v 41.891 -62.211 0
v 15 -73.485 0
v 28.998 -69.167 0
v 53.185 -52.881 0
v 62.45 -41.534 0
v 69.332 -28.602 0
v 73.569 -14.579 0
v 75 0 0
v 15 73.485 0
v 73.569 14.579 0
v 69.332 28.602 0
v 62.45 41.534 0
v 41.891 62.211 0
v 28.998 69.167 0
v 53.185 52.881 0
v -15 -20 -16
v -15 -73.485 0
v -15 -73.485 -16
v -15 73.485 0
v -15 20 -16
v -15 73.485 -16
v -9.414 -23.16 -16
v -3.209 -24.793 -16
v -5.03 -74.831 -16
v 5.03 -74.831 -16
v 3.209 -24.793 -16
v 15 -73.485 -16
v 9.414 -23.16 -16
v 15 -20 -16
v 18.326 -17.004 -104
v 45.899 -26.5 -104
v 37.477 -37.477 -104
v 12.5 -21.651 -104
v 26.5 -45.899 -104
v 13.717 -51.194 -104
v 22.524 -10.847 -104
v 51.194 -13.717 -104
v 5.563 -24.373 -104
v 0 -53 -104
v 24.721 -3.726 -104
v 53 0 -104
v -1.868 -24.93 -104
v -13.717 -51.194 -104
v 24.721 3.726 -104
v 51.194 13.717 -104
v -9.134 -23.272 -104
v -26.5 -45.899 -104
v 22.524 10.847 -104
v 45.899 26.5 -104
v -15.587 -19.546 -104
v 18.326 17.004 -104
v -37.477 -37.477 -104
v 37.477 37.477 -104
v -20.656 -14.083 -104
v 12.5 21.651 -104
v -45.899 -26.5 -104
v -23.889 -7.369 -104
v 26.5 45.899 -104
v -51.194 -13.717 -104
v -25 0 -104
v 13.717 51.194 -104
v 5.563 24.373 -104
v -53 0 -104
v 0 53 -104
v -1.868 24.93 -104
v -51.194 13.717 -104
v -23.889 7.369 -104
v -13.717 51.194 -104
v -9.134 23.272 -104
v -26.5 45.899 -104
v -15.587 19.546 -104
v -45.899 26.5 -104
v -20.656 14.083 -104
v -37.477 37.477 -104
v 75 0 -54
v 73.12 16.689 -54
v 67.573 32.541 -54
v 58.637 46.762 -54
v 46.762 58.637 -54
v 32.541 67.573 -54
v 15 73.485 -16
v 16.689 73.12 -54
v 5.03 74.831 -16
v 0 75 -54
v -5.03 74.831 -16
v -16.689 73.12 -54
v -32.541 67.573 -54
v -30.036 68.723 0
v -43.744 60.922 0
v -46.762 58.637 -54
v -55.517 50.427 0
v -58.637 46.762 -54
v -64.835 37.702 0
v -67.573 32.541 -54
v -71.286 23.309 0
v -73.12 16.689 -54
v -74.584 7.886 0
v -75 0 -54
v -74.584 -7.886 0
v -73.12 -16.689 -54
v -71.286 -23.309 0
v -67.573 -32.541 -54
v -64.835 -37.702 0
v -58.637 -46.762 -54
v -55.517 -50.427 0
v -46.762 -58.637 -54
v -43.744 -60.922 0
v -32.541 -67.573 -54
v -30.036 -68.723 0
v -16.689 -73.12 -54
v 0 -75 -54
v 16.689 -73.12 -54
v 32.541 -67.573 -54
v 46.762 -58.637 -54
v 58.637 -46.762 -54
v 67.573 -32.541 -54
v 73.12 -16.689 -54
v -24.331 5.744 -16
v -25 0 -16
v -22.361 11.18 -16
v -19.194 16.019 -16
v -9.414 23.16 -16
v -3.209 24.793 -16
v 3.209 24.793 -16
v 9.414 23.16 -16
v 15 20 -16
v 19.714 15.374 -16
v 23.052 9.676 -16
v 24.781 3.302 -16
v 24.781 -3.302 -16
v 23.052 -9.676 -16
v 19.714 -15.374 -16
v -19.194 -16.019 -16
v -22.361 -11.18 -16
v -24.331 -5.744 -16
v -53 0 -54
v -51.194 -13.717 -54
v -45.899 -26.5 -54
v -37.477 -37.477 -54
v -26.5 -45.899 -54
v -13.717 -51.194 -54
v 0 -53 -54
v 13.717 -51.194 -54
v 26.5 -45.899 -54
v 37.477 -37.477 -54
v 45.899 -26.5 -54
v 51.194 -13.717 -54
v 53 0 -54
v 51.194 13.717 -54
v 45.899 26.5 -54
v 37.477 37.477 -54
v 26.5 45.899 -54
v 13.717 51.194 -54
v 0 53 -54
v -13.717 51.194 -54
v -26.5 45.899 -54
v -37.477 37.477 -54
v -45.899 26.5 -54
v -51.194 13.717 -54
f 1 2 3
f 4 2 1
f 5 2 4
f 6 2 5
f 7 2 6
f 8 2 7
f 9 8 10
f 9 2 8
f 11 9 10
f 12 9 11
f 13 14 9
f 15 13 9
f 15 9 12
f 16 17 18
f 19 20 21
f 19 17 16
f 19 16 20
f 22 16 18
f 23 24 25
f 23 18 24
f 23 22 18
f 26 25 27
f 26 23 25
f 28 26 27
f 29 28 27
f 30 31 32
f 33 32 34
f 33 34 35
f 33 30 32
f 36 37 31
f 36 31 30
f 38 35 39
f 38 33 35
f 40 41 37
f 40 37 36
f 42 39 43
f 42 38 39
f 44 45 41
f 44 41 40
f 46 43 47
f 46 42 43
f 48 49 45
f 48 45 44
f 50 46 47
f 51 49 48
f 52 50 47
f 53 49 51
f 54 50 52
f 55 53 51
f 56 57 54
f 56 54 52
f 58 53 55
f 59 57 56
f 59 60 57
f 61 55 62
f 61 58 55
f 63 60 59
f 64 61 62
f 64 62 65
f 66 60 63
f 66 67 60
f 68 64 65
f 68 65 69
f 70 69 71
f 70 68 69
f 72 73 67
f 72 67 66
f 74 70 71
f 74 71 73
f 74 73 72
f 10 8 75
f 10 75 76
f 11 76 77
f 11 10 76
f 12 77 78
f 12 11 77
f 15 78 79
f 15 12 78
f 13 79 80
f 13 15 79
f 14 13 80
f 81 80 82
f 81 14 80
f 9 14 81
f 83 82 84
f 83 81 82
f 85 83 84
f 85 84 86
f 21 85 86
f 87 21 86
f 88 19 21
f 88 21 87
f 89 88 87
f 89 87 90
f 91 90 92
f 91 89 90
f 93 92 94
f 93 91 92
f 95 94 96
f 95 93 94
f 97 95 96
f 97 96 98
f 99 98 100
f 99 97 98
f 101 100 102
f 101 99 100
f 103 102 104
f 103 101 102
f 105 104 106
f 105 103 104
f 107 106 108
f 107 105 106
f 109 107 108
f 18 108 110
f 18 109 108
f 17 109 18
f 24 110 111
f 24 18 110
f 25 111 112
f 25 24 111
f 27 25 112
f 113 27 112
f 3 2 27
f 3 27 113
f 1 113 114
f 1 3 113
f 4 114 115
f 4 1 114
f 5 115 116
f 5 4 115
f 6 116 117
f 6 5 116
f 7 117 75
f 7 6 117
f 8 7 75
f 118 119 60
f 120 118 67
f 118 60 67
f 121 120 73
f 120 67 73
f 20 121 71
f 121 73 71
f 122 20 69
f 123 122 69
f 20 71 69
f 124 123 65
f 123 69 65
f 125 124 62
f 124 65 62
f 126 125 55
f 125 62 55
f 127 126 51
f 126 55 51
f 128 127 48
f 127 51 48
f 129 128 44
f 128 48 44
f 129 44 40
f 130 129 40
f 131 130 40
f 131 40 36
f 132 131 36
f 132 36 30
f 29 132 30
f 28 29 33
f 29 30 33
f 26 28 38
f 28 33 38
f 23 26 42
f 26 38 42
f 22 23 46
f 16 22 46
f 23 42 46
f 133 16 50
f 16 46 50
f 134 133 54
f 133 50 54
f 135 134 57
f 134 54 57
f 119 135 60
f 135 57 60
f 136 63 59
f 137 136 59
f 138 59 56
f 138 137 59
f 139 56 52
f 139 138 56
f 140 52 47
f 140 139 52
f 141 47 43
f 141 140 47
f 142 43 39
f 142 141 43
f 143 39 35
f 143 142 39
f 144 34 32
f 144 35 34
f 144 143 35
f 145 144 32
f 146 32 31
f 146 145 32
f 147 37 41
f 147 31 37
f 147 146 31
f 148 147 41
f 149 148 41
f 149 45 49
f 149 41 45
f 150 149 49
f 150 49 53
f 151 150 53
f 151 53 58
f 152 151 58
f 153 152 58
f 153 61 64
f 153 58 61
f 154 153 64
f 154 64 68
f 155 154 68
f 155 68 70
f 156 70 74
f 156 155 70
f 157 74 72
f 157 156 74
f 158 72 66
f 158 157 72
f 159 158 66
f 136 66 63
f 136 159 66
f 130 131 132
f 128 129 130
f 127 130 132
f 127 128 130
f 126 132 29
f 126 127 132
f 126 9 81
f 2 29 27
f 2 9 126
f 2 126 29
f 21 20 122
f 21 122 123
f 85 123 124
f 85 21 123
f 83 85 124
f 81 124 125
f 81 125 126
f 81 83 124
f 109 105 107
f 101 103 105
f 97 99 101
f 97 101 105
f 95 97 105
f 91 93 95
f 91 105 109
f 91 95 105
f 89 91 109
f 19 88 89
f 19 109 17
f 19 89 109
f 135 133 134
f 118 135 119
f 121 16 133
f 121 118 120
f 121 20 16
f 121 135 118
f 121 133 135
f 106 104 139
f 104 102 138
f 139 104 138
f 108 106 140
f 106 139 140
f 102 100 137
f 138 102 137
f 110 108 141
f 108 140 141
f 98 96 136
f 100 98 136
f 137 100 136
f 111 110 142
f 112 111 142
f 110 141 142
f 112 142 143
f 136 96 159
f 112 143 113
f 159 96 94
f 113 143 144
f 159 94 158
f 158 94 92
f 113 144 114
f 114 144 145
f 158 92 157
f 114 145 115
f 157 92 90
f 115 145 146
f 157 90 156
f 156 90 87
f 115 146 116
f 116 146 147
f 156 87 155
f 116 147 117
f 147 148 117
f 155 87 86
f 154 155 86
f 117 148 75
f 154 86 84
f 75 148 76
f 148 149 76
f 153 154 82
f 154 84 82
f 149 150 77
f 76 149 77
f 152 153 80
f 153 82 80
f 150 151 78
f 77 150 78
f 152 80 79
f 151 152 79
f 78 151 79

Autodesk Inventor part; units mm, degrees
ref_plane "YZ Plane" through (0, 0, 0) normal (1, 0, 0) x (0, 1, 0)
ref_plane "XZ Plane" through (0, 0, 0) normal (0, 1, 0) x (-1, 0, 0)
ref_plane "XY Plane" through (0, 0, 0) normal (0, 0, 1) x (1, 0, 0)
sketch "Sketch1" plane through (0, 0, 0) normal (0, 0, 1) x (1, 0, 0)
  circle A0 centre (0, 0) radius 75
  dimension "d0" = 150
extrude "Extrusion1" add sketch "Sketch1" against normal blind 54
sketch "Sketch2" plane through (0, 0, 0) normal (0, 0, 1) x (1, 0, 0)
  line L0 (-15, 75) -> (15, 75)
  line L1 (15, 75) -> (15, -75)
  line L2 (15, -75) -> (-15, -75)
  line L3 (-15, -75) -> (-15, 75)
  point P0 (0, 0)
  dimension "d3" = 30
  dimension "d4" = 15
  dimension "d5" = 75
  dimension "d6" = 75
extrude "Extrusion2" cut sketch "Sketch2" against normal blind 16
sketch "Sketch3" plane through (0, 0, -54) normal (0, 0, -1) x (-1, 0, 0)
  circle A0 centre (0, 0) radius 53
  dimension "d9" = 106
extrude "Extrusion3" add sketch "Sketch3" along normal blind 50
sketch "Sketch4" plane through (0, 0, -104) normal (0, 0, -1) x (-1, 0, 0)
  circle A0 centre (0, 0) radius 25
  dimension "d12" = 50
extrude "Extrusion4" cut sketch "Sketch4" against normal blind 88
equation "\"d4\" = 0.5 * d3"
equation "\"d6\" = d5"
